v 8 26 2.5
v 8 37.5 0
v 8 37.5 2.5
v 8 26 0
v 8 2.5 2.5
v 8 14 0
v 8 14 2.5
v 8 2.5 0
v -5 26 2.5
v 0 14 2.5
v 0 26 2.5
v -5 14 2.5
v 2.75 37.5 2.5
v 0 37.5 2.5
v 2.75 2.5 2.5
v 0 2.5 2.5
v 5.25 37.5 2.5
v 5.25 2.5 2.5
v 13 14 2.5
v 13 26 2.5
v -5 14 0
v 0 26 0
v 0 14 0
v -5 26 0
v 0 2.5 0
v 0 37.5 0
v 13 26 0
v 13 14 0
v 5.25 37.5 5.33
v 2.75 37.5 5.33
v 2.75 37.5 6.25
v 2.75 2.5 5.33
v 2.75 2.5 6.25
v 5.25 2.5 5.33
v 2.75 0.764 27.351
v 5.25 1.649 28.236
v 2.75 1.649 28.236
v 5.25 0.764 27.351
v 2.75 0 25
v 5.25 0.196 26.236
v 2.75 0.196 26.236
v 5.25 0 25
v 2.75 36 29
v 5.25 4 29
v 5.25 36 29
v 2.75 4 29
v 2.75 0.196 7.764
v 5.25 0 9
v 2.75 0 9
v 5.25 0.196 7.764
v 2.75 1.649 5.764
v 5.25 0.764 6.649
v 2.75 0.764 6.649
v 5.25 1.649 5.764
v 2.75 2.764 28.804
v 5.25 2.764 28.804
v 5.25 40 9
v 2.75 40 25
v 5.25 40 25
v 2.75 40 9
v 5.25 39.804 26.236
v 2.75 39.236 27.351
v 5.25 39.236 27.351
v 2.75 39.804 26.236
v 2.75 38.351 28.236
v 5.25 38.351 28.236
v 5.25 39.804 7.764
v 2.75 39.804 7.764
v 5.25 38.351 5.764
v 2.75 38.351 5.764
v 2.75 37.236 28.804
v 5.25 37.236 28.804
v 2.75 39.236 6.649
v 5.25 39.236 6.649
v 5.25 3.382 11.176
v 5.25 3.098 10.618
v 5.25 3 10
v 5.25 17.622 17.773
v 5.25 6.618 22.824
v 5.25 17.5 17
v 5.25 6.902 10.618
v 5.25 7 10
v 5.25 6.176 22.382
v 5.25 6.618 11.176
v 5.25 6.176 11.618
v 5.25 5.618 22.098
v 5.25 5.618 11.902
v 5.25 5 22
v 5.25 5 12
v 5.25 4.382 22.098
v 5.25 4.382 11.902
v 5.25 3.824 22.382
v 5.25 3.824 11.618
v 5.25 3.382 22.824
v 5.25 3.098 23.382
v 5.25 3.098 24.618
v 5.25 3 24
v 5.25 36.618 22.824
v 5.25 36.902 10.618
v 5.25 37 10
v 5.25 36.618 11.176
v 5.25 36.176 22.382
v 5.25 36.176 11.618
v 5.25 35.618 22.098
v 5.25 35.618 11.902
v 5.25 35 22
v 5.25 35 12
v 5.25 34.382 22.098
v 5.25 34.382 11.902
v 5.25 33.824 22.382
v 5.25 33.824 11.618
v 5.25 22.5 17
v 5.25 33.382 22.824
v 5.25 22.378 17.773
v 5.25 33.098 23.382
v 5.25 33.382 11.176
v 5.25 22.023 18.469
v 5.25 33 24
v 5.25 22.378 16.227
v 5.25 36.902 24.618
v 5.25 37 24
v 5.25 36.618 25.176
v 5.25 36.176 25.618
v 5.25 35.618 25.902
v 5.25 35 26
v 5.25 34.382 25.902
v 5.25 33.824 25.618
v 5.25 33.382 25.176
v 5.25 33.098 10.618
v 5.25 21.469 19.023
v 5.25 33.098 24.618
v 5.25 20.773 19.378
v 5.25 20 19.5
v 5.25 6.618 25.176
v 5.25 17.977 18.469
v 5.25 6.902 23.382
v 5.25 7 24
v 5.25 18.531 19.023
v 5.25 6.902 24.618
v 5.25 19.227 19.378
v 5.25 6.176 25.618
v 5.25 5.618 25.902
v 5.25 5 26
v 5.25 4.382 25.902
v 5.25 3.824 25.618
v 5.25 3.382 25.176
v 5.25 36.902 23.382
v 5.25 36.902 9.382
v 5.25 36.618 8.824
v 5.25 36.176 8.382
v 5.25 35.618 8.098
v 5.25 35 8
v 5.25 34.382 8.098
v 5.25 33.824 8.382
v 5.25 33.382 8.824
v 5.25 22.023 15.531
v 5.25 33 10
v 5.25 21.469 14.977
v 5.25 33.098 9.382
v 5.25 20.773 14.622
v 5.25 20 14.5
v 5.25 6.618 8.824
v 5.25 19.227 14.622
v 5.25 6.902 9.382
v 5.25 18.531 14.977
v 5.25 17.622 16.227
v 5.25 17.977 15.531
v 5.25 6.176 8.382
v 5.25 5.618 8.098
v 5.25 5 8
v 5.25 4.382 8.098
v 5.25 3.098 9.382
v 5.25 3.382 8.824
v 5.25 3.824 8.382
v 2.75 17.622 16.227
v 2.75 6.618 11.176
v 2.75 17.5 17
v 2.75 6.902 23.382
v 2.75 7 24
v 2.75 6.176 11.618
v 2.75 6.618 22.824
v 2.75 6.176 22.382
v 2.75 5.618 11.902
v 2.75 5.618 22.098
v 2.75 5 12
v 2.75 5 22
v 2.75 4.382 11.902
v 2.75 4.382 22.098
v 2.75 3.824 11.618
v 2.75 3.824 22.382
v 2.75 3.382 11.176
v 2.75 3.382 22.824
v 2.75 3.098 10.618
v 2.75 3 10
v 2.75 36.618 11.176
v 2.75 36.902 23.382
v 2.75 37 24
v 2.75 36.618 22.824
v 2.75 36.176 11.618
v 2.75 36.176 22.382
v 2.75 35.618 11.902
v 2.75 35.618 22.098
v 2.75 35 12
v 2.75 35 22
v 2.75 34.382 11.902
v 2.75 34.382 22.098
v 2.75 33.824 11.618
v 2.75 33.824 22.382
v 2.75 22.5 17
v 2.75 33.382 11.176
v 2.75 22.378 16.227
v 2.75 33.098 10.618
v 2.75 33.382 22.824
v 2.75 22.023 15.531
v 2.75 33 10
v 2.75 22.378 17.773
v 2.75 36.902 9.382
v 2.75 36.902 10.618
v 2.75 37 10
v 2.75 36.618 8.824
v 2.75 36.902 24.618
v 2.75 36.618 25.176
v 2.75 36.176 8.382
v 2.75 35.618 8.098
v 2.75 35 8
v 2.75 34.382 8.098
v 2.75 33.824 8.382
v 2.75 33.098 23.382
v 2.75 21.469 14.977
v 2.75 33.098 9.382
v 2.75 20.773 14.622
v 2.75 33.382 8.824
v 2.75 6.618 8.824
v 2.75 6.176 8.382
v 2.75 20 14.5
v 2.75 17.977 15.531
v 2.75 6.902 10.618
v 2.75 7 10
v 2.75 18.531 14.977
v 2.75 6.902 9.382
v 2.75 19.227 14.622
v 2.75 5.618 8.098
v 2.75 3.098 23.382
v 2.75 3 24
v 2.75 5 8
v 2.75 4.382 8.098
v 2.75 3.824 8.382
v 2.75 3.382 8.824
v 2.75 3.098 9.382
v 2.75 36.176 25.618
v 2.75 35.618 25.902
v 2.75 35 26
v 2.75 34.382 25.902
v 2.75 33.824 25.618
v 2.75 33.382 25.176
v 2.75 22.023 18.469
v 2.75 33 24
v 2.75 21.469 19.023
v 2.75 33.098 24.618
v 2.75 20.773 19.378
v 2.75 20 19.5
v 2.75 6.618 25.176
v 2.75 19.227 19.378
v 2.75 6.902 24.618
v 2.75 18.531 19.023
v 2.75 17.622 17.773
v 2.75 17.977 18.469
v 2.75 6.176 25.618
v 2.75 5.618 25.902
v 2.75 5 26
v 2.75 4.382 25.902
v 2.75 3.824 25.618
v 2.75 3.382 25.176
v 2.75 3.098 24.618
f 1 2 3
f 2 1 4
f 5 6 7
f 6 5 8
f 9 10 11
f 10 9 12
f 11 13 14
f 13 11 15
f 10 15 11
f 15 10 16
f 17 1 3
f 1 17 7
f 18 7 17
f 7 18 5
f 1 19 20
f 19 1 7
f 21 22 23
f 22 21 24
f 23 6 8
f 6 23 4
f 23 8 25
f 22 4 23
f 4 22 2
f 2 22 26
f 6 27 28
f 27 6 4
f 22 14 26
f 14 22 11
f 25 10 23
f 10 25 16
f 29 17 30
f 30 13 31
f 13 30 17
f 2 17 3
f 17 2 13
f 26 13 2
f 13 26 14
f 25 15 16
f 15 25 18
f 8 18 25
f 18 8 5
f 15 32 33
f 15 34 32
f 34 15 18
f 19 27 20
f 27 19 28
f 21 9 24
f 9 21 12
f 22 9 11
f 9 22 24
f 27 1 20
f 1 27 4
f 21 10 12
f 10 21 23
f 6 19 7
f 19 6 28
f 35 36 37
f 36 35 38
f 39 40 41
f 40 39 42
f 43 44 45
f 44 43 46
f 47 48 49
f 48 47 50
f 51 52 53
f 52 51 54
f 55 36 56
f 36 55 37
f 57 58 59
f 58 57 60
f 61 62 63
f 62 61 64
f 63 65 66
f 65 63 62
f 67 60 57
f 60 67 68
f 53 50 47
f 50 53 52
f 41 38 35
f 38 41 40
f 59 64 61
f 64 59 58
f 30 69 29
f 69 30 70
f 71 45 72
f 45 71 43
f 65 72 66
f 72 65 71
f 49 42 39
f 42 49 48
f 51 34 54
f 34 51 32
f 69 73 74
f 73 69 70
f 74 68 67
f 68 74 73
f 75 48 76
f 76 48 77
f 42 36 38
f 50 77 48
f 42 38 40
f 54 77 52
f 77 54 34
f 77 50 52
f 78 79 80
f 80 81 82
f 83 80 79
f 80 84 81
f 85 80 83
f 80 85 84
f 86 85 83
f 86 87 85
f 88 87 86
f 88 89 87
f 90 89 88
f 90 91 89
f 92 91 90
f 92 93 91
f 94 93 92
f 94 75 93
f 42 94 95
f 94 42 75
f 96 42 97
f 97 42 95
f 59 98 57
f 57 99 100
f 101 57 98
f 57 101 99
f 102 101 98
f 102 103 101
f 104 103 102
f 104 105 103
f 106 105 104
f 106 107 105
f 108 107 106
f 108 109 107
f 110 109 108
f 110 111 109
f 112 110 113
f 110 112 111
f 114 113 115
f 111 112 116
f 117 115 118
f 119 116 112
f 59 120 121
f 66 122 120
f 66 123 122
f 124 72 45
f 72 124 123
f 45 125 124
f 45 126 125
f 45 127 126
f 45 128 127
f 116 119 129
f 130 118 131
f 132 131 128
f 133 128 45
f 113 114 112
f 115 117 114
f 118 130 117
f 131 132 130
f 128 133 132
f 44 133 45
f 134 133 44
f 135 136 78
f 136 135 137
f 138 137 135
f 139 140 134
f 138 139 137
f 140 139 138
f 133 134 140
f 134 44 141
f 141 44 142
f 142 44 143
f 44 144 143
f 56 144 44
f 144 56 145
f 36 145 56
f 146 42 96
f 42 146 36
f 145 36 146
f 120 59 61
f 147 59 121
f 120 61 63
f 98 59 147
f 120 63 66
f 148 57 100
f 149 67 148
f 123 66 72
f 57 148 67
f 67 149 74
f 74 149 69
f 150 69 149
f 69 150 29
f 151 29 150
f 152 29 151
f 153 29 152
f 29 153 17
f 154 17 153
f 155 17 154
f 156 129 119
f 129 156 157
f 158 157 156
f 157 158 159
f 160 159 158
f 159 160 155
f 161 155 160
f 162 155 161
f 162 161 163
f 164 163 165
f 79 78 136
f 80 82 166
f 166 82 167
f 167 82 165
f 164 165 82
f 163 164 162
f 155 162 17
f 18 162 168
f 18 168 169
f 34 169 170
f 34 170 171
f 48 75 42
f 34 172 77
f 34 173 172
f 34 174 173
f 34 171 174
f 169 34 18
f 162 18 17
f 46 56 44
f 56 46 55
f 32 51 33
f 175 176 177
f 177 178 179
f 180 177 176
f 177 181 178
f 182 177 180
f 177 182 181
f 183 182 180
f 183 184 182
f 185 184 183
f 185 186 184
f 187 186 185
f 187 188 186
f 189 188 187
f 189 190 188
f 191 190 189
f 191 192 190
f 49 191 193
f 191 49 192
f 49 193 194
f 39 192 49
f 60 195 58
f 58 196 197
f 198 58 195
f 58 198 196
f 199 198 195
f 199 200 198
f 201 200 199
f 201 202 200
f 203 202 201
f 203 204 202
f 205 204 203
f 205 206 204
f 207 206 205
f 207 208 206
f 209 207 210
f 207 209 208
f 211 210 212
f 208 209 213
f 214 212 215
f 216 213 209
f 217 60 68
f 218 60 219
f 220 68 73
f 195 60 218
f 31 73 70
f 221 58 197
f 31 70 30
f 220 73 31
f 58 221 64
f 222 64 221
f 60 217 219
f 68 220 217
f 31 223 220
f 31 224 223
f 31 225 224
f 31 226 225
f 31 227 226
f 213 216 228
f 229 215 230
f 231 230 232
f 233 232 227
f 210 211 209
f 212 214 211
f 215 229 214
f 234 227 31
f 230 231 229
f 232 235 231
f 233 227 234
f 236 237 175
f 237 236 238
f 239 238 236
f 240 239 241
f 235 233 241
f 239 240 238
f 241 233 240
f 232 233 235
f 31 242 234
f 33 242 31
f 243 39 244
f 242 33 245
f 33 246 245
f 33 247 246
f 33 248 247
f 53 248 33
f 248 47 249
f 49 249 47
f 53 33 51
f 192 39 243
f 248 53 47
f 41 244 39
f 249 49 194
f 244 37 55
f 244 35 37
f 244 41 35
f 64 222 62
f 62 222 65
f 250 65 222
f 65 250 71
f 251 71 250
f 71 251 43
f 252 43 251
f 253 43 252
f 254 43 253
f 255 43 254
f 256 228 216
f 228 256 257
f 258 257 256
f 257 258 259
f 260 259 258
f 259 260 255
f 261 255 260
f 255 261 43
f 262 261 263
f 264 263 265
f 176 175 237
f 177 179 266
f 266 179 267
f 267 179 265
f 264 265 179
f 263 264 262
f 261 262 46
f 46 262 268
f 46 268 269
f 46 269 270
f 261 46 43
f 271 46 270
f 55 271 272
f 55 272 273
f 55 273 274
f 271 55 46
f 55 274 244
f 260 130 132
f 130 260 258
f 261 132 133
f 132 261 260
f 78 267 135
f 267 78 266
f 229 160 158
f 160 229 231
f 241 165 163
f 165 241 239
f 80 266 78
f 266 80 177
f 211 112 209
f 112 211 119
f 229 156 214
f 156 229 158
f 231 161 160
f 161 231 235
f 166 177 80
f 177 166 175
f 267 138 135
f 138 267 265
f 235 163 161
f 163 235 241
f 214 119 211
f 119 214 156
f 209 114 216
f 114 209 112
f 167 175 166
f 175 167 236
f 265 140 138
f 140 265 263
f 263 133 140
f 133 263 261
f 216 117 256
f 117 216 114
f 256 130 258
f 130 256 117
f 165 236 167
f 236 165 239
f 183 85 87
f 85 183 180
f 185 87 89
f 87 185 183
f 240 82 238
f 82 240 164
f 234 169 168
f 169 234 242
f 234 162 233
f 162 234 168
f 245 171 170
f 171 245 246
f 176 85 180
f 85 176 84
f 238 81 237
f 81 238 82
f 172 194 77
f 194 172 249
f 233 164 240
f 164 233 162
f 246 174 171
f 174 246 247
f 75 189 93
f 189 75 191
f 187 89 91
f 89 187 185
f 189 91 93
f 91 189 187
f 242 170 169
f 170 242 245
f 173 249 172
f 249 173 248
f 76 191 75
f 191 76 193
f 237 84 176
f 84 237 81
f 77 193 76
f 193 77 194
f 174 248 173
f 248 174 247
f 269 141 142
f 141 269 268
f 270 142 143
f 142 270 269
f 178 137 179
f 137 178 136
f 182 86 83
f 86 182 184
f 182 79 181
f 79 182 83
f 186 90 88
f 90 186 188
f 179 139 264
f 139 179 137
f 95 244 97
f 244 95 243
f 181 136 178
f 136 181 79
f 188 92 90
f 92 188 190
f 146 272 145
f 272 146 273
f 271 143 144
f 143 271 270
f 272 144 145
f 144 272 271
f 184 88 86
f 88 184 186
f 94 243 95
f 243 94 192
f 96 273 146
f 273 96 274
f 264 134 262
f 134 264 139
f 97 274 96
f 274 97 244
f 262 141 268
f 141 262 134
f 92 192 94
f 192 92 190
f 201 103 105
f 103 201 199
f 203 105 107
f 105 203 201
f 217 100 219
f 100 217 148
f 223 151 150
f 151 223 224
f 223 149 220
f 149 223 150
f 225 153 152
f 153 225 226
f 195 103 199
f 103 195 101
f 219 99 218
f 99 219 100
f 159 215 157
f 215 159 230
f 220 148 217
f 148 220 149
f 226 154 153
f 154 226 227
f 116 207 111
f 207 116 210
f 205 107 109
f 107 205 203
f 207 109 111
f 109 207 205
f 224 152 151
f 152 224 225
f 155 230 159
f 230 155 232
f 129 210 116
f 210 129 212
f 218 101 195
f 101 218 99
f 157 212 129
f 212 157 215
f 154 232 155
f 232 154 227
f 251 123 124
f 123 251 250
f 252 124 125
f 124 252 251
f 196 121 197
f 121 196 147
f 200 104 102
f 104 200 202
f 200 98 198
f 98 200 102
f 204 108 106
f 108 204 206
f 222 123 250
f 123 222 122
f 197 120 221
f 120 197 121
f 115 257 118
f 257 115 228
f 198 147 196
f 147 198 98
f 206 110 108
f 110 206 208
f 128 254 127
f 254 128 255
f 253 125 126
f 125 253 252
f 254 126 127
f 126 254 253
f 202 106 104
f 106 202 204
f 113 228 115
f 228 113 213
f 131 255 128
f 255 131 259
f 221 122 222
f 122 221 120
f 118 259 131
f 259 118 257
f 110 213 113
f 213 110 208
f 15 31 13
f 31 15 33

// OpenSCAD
$fn=20;
$fa=0.1;
wall = 2.5;

//part for gripper
height = 8;
width = 35;
thingW = 12;
thingH = 5;

//part for ...
width2 = 40;
height2 = 24;
rounding = 4;
h1=2.5;
h2=2;
d=5;


d2=5;


merged();



module merged() {
	union(){
		translate([-wall/2+height/2,(width2-width)/2,wall/2]) {
			cube([wall,width,d2]);
		}
		translate([0,(width2-width)/2,0]) {
			part1();
		}
		translate([wall/2+height/2,0,d2]) {
			rotate([0,-90,0])
				part2();
		}
	}
}

module part1() {
	union(){
		cube([height,width,wall]);
		translate([-thingH,(width-thingW)/2,0])
			cube([height+2*thingH,thingW,wall]);
	}
}

module part2() {
	difference() {
		translate([rounding,rounding,0]) {
			minkowski() {
				cube([height2-2*rounding,width2-2*rounding,wall-0.1]);
				cylinder(r=rounding, h=0.1);
			}
		}
		translate([height2/2,width2/2,-0.5]) cylinder(r=h1, h=wall+1);
		translate([d,d,-0.5]) cylinder(r=h2, h=wall+1);
		translate([height2-d,d,-0.5]) cylinder(r=h2, h=wall+1);
		translate([d,width2-d,-0.5]) cylinder(r=h2, h=wall+1);
		translate([height2-d,width2-d,-0.5]) cylinder(r=h2, h=wall+1);
	}
}
